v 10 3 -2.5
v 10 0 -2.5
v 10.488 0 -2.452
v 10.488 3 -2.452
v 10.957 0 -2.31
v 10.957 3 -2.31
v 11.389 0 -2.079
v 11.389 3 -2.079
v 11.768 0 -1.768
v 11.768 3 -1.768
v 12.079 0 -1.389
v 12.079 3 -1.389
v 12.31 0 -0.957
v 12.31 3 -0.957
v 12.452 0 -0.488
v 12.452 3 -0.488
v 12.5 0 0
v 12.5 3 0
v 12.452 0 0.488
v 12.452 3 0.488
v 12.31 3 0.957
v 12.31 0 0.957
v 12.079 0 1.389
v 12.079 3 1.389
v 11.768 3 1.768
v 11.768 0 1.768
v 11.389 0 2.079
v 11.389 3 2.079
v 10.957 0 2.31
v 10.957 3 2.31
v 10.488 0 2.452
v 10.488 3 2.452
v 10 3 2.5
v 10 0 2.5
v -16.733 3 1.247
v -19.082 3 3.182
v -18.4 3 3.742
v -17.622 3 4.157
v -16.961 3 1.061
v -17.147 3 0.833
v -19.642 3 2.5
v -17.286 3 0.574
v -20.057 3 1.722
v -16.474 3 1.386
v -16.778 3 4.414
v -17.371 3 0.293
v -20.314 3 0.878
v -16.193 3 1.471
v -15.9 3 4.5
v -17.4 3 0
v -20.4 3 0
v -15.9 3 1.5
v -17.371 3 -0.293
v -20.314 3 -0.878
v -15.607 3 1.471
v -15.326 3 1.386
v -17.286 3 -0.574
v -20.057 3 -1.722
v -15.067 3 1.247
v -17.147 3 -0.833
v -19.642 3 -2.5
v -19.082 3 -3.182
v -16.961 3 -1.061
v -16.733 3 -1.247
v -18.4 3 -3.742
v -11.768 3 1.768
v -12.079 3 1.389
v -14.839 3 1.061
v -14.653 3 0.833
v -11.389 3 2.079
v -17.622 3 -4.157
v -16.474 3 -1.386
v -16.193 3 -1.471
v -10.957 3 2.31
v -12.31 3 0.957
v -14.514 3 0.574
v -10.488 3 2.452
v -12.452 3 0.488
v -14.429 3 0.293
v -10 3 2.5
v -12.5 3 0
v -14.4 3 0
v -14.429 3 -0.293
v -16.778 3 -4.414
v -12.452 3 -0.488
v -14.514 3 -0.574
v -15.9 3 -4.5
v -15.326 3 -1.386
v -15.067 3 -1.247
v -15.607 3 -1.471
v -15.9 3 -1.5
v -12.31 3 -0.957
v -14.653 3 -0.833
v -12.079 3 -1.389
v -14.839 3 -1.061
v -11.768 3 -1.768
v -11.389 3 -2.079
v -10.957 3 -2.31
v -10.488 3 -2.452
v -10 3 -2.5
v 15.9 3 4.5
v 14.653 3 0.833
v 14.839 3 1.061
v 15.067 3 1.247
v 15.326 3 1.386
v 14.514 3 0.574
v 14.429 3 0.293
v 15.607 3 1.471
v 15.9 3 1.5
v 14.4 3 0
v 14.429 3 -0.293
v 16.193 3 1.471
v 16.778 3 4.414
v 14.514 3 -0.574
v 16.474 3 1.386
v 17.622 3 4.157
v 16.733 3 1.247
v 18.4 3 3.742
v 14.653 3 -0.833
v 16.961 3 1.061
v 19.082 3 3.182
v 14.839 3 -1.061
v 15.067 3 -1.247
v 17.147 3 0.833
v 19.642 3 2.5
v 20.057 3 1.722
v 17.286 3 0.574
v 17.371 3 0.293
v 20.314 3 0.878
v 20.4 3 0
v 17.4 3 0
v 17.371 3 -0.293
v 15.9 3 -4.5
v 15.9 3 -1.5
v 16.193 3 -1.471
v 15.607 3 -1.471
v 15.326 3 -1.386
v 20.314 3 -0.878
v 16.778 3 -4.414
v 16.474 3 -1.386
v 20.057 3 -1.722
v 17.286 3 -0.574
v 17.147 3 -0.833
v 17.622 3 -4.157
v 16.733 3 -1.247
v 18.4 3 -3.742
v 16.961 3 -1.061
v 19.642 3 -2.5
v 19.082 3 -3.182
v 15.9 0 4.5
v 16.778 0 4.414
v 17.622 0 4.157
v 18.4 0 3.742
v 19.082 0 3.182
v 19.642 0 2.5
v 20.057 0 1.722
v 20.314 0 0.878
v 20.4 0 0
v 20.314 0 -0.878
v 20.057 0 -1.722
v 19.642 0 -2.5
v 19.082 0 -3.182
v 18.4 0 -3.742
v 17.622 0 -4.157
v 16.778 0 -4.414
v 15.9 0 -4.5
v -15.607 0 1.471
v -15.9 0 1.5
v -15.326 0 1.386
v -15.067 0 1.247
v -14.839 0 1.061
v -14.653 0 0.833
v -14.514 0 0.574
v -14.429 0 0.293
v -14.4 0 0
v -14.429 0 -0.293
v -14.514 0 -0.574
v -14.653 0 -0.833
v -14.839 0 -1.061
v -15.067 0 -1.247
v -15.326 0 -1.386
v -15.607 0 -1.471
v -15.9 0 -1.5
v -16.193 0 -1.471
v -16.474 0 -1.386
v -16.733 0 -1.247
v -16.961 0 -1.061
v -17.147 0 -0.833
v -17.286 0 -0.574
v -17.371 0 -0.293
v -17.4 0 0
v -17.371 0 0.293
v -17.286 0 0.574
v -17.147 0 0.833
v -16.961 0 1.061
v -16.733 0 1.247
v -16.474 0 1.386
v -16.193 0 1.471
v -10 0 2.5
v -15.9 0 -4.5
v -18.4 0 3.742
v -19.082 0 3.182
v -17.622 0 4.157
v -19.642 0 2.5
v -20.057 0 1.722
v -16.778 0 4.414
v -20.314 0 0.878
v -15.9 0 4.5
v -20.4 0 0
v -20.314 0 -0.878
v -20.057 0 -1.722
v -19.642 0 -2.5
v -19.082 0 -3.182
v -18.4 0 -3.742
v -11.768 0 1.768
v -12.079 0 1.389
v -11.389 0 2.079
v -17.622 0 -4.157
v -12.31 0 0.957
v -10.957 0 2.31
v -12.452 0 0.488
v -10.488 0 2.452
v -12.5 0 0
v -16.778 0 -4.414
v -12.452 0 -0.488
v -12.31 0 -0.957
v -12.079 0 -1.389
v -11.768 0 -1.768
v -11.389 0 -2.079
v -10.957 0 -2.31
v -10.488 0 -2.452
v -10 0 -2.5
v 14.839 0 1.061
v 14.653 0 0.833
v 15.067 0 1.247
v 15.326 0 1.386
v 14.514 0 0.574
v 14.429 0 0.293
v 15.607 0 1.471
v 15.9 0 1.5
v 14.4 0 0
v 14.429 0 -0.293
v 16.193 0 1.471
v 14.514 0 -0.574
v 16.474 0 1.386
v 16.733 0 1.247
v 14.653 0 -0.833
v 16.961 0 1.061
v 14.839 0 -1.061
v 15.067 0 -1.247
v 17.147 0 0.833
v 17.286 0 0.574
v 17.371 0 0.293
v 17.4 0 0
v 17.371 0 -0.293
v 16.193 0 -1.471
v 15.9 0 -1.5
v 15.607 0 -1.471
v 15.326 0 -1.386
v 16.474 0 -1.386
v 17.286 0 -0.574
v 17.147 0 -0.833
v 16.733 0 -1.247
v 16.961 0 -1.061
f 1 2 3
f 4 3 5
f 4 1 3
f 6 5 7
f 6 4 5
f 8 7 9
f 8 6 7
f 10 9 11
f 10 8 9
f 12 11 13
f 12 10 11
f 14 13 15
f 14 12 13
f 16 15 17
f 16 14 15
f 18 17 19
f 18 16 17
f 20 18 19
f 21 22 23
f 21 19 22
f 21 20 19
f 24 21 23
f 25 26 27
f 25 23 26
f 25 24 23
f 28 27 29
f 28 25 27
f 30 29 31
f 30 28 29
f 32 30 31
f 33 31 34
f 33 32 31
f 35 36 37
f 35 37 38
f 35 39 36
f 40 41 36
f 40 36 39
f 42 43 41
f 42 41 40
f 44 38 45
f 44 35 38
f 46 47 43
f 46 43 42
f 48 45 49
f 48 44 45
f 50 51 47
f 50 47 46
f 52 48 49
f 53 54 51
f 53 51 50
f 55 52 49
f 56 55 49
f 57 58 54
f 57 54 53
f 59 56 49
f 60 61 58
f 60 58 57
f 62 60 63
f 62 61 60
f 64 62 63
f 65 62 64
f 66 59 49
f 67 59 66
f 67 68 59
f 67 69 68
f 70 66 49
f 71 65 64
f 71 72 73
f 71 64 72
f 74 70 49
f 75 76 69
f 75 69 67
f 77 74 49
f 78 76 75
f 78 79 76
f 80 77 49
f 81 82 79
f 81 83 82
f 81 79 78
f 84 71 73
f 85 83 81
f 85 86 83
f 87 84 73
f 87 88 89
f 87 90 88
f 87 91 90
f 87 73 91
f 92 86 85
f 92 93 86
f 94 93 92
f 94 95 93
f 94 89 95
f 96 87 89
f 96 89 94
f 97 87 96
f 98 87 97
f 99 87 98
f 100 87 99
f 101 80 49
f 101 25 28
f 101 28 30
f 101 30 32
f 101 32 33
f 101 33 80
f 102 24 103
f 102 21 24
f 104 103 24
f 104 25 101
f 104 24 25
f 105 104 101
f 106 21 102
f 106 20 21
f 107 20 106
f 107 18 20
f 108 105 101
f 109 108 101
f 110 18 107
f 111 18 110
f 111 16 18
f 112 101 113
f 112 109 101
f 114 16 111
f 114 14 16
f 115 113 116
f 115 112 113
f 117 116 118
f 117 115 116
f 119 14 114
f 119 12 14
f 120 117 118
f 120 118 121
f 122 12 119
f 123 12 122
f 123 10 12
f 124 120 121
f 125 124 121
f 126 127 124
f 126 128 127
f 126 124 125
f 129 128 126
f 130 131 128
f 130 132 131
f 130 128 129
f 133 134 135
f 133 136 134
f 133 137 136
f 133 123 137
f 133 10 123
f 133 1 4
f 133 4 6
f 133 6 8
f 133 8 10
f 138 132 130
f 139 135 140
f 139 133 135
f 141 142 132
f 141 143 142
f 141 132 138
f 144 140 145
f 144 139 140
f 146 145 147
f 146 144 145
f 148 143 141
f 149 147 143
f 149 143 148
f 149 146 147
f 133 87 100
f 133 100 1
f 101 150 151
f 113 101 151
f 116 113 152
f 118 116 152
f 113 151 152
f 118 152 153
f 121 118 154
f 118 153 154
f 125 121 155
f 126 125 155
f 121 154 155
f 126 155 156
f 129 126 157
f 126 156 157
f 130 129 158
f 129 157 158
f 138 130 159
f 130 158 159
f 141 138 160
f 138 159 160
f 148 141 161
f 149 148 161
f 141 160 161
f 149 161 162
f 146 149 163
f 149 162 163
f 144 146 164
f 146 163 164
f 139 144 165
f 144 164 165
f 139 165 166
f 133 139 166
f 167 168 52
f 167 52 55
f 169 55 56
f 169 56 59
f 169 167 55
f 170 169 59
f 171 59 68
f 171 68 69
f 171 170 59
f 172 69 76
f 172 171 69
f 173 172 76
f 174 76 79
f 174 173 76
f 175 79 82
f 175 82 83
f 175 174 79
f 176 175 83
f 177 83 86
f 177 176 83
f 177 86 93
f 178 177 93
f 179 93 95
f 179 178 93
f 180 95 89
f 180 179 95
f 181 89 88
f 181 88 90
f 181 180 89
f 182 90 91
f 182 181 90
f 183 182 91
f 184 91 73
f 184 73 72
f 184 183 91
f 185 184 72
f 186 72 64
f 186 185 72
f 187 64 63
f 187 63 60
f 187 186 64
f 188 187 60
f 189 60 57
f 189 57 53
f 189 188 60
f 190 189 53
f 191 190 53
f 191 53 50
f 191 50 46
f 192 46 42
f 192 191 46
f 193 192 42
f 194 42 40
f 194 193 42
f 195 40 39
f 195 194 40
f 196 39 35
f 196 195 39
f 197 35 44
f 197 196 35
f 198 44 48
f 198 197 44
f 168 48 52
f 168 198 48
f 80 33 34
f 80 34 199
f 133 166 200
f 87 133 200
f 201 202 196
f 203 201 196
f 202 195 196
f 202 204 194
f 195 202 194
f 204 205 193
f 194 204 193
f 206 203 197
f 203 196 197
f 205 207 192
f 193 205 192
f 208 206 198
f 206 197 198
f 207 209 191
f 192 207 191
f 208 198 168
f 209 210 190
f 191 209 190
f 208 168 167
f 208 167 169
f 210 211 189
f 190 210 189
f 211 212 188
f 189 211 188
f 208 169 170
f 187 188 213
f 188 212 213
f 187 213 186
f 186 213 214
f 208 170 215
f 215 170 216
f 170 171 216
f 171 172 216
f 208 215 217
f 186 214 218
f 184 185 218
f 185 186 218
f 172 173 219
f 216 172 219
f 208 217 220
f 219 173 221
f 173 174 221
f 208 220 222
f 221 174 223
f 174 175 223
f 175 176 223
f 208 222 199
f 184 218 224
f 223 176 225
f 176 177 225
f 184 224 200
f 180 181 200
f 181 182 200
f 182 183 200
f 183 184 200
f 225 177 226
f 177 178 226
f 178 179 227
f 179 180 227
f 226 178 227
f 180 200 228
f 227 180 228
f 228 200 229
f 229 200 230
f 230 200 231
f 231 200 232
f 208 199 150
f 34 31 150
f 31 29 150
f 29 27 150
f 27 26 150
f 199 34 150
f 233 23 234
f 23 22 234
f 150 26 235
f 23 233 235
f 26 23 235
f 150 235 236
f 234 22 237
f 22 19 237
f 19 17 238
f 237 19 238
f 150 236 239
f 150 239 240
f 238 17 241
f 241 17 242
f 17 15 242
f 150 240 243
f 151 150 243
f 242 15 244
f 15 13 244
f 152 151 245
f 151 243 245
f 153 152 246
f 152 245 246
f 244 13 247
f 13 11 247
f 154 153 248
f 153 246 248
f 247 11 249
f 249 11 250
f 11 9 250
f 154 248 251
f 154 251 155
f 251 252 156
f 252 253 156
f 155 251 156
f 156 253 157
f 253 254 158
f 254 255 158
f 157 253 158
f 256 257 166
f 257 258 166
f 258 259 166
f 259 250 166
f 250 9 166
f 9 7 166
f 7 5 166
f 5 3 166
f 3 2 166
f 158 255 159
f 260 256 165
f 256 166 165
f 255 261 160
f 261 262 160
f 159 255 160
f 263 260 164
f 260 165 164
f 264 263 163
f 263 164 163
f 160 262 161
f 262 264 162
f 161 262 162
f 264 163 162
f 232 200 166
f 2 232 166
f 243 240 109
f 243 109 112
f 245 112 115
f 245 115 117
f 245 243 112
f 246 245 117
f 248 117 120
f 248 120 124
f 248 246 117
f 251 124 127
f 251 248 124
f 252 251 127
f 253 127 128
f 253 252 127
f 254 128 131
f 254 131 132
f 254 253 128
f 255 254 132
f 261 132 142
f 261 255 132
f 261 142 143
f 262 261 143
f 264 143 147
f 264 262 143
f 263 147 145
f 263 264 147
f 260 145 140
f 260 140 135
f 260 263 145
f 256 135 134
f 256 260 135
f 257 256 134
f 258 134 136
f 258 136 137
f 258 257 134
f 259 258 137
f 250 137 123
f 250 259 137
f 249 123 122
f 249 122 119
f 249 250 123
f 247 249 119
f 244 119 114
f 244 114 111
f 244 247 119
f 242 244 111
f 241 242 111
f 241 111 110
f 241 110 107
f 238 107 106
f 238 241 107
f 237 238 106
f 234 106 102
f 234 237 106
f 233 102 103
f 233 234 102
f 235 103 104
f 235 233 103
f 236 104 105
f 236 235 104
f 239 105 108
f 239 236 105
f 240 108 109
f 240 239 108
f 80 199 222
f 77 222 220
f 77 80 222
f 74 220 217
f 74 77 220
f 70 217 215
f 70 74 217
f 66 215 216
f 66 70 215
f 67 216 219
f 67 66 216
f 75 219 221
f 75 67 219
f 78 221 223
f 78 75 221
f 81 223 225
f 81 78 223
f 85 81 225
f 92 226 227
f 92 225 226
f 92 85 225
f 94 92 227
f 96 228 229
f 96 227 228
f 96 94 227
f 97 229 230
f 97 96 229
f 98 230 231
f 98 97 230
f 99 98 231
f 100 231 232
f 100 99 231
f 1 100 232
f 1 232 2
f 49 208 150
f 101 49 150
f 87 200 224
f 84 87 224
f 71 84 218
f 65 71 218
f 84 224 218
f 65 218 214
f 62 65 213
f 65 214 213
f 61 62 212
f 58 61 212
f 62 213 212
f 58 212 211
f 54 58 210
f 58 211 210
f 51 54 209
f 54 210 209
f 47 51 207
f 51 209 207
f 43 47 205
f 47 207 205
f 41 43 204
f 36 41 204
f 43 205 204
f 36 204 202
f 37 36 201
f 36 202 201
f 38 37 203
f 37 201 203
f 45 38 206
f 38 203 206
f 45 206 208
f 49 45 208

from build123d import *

# Parameters (mm, degrees)
SKETCH_1_R          = 1.5
EXTRUDE_1_DEPTH     = 3
CUT_EXTRUDE_1_DEPTH = 22.104738804


with BuildPart() as part:
    # 草图1 → 凸台-拉伸1 (new body)
    with BuildSketch(Plane(origin=(0, 0, 0), x_dir=(1, 0, 0), z_dir=(0, 1, 0))):
        with BuildLine():
            Line((15.9, 4.5), (-15.9, 4.5))
            ThreePointArc((-15.9, 4.5), (-20.4, 0), (-15.9, -4.5))
            Line((-15.9, -4.5), (15.9, -4.5))
            ThreePointArc((15.9, -4.5), (20.4, 0), (15.9, 4.5))
        make_face()
        with Locations(Location((-15.9, 0, 0), (0, 0, 270))):
            Circle(SKETCH_1_R, mode=Mode.SUBTRACT)
        with Locations(Location((15.9, 0, 0), (0, 0, 270))):
            Circle(SKETCH_1_R, mode=Mode.SUBTRACT)
    extrude(amount=EXTRUDE_1_DEPTH)

    # 草图2 → 切除-拉伸1 (cut, through all)
    with BuildSketch(Plane(origin=(0, 3, 0), x_dir=(1, 0, 0), z_dir=(0, 1, 0))):
        with BuildLine():
            Line((-10, 2.5), (10, 2.5))
            ThreePointArc((10, 2.5), (12.5, 0), (10, -2.5))
            Line((10, -2.5), (-10, -2.5))
            ThreePointArc((-10, -2.5), (-12.5, 0), (-10, 2.5))
        make_face()
    extrude(amount=-CUT_EXTRUDE_1_DEPTH, mode=Mode.SUBTRACT)


solid = part.part
